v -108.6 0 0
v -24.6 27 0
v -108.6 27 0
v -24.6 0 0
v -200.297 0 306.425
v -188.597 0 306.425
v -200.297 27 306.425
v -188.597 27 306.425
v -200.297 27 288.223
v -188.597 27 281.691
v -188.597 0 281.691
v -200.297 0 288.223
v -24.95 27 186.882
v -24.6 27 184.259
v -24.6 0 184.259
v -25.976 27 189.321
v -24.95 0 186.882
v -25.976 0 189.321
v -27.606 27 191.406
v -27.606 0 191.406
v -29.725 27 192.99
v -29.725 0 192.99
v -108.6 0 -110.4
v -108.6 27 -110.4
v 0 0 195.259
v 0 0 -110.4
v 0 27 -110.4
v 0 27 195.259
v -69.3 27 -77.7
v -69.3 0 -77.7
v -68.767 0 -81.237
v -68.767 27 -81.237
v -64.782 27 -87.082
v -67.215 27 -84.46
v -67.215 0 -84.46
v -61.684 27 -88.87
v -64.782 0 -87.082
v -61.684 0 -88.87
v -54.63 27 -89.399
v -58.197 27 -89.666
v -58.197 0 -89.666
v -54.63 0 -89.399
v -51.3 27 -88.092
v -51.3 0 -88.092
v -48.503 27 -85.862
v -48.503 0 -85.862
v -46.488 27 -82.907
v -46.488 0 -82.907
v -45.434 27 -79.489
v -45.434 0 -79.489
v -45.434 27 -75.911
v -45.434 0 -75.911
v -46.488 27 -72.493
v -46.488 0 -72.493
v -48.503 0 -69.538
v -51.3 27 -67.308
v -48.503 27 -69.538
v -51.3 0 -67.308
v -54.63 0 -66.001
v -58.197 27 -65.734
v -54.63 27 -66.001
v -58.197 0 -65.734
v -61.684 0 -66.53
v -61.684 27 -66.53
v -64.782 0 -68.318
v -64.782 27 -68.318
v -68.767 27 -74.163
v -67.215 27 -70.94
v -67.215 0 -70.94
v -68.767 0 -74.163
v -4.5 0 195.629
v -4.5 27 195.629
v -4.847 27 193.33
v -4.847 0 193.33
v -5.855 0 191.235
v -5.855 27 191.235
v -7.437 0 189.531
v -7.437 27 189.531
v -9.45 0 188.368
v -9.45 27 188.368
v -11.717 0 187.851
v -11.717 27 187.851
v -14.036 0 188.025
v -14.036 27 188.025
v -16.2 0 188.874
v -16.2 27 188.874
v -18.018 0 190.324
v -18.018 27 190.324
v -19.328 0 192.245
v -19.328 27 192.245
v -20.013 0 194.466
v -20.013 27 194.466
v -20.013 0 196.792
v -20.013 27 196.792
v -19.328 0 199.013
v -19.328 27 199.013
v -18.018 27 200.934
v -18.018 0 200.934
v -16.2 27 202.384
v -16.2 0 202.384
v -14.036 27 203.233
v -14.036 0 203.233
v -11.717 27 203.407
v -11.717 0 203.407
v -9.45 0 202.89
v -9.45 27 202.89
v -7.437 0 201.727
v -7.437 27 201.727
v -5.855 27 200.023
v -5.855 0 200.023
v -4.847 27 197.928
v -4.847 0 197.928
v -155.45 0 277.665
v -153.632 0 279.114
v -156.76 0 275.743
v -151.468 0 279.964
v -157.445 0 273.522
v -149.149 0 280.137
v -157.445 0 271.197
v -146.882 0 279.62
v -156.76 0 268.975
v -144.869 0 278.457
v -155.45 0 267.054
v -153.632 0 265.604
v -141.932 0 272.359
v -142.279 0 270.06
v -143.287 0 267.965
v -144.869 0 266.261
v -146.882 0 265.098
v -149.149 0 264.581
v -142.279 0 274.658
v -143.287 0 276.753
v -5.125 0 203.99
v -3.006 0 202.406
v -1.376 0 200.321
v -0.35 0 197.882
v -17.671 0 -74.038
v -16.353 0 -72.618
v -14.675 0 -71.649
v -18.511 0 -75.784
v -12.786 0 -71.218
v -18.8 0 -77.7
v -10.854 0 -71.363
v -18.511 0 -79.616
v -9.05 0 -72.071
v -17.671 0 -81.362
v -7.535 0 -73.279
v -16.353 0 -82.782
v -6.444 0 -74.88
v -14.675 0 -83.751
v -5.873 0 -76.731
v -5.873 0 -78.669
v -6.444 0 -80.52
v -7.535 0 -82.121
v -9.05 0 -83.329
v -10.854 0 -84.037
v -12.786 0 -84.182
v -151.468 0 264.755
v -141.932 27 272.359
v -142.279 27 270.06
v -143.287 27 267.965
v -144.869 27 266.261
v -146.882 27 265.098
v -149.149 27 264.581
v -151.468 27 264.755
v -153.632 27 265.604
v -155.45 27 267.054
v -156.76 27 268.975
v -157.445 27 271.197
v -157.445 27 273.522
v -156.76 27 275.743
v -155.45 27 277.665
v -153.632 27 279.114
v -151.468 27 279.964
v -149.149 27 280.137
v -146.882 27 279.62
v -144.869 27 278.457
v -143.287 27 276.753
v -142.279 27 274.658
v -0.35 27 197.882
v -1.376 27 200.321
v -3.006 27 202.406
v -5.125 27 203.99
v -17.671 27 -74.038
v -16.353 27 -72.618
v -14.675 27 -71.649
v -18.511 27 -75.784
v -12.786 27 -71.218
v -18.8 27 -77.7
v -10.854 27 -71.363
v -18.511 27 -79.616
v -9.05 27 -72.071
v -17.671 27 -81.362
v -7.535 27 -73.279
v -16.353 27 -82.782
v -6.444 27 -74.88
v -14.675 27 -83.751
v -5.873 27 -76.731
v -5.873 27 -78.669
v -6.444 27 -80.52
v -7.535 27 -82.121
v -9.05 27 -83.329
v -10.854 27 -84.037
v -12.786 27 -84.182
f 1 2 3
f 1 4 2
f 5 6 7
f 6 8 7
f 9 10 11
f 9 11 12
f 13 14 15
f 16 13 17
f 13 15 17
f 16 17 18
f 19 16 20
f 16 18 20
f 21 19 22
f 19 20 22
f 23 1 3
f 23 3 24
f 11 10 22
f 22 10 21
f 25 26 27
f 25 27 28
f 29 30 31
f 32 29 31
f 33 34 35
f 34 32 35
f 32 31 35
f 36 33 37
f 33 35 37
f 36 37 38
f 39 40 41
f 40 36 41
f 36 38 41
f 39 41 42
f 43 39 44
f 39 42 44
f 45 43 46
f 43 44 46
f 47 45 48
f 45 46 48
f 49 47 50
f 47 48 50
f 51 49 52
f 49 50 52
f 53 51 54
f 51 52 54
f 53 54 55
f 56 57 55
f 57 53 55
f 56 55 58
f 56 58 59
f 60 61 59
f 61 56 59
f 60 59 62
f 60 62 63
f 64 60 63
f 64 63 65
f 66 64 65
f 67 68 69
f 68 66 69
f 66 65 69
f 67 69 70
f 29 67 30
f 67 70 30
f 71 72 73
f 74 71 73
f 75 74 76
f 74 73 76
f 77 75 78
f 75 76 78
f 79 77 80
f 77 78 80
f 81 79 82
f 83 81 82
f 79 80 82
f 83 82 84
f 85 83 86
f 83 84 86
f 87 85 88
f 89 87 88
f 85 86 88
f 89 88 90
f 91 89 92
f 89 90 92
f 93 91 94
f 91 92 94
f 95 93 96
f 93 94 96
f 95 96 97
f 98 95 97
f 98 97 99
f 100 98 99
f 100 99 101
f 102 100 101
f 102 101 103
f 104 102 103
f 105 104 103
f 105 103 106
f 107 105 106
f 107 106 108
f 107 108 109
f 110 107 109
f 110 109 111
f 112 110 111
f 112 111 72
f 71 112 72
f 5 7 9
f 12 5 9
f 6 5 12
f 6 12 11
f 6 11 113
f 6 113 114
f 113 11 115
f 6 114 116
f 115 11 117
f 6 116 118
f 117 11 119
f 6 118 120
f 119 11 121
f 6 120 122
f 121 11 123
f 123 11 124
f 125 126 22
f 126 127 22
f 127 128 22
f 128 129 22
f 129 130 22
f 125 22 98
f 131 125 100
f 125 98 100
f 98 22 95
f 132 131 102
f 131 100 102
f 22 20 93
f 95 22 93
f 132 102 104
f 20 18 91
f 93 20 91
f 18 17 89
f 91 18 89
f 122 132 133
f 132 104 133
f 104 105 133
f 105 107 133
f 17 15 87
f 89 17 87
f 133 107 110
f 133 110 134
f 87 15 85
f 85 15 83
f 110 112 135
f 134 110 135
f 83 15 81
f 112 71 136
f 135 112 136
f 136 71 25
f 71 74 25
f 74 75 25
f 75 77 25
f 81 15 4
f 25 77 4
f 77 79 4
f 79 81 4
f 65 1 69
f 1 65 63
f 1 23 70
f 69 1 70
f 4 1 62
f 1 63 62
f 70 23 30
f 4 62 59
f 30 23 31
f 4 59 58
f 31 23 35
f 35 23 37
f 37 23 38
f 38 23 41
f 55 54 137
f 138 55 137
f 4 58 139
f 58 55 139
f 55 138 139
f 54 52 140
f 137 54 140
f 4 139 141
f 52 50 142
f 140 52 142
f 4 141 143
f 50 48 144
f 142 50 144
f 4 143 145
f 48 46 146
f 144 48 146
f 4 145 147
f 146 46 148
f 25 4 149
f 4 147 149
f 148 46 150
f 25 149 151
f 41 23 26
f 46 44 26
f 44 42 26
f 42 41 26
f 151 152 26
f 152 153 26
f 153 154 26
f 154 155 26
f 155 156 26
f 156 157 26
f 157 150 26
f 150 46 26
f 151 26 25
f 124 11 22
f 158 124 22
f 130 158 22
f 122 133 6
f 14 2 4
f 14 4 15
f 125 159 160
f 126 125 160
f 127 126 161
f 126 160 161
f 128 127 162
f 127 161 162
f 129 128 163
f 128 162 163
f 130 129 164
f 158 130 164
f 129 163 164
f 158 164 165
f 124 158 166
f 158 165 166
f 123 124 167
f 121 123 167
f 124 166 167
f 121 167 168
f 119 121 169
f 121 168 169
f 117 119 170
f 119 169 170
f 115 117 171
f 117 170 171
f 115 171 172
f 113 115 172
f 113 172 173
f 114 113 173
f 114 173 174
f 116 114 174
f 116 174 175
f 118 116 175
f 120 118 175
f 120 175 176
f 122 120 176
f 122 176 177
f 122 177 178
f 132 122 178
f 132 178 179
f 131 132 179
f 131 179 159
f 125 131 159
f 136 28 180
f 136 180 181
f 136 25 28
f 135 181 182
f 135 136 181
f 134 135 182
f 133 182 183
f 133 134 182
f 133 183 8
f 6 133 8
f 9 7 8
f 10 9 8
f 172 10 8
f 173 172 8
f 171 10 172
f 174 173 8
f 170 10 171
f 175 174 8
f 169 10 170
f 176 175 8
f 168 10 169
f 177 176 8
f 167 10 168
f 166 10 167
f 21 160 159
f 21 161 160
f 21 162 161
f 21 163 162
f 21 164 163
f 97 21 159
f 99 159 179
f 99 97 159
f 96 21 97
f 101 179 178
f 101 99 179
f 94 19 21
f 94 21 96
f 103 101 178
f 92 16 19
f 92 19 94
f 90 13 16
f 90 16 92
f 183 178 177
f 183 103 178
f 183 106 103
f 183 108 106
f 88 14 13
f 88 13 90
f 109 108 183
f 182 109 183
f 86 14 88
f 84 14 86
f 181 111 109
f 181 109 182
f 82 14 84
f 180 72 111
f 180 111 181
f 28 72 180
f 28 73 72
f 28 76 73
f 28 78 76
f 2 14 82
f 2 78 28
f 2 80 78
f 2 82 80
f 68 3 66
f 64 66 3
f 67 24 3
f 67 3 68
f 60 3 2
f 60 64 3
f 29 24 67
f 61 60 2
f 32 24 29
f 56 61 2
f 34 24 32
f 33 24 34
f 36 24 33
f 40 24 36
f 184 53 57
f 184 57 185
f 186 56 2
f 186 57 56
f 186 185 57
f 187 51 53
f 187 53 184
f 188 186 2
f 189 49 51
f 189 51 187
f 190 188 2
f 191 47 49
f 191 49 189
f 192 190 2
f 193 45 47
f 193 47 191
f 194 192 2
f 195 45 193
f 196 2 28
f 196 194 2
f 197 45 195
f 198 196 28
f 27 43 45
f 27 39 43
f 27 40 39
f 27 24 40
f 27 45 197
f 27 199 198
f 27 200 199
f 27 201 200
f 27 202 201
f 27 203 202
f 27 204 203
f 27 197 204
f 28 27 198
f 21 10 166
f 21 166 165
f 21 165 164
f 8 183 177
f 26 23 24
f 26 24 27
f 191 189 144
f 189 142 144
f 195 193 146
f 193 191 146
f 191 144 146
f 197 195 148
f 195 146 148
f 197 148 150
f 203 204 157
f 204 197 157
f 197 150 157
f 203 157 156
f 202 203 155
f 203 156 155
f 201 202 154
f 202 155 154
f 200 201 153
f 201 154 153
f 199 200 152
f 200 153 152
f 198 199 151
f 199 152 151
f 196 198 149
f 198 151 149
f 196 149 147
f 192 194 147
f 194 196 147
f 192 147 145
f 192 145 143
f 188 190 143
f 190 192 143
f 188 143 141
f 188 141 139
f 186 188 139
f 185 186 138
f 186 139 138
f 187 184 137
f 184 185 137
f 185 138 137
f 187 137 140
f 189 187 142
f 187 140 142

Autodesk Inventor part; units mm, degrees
ref_plane "YZ Plane" through (0, 0, 0) normal (1, 0, 0) x (0, 1, 0)
ref_plane "XZ Plane" through (0, 0, 0) normal (0, 1, 0) x (-1, 0, 0)
ref_plane "XY Plane" through (0, 0, 0) normal (0, 0, 1) x (1, 0, 0)
sketch "Sketch1" plane through (0, 0, 0) normal (0, 1, 0) x (-1, 0, 0)
  line L0 (0, 0) -> (108.6, 0)
  line L1 (108.6, 0) -> (108.6, -110.4)
  line L2 (108.6, -110.4) -> (0, -110.4)
  line L3 (0, -110.4) -> (0, 0)
  circle A0 centre (12.3, -77.7) radius 6.5
  circle A1 centre (57.3, -77.7) radius 12
  dimension "d0" = 108.6
  dimension "d1" = 110.4
  dimension "d2" = 13
  dimension "altura_hoyo" = 12.3
  dimension "d5" = 32.7
  dimension "d6" = 24
  dimension "d7" = 45
extrude "Extrusion1" add sketch "Sketch1" along normal blind 27
sketch "Sketch2" plane through (0, 27, 0) normal (0, 1, 0) x (1, 0, 0)
  line L0 (0, 110.4) -> (-108.6, 110.4) construction
  line L1 (0, 0) -> (0, -195.629)
  line L2 (0, -195.629) -> (0, -201.129)
  line L3 (0, -201.129) -> (-188.5967, -306.4251)
  line L4 (-24.6, 0) -> (-24.6, -190.129)
  line L5 (-188.5967, -281.6906) -> (-24.6, -190.129)
  line L6 (-188.5967, -306.4251) -> (-188.5967, -281.6906)
  circle A0 centre (-12.3, -195.629) radius 7.8
  circle A1 centre (-12.3, 77.7) radius 6.5 construction
  line L7 (-108.6, 0) -> (0, 0) projected
  line L8 (0, 0) -> (-24.6, 0)
  line L9 (-12.3, -195.629) -> (-149.732, -272.3592) construction
  line L10 (0, -201.129) -> (-12.3, -195.629) construction
  line L11 (-42.6296, -182.067) -> (-12.3, -195.629) construction
  circle A2 centre (-149.732, -272.3592) radius 7.8
  dimension "d10" = 306.029
  dimension "d11" = 5.5
  dimension "d12" = 119.175
  dimension "Ancho_marco" = 24.6
  dimension "d18" = 15.6
  dimension "d21" = 216
  dimension "d26" = 12.3
  dimension "d_entre_ejes" = 157.401
  dimension "d28" = 15.6
  dimension "d31" = 195.629
  dimension "d32" = 273.329
extrude "Extrusion2" add sketch "Sketch2" against normal blind 27 contours L1 L2 L3 L6 L5 L4 L7 | A2
fillet "Fillet1" radius 10 2 edges at (-24.6, 13.5, 190.129) (0, 13.5, 201.129)
sketch "Sketch3" plane through (0, 27, 0) normal (0, 1, 0) x (1, 0, 0)
  line L0 (-188.5967, -281.6906) -> (-188.5967, -306.4251) projected
  line L1 (-188.5967, -306.4251) -> (-200.2967, -306.4251)
  line L2 (-200.2967, -306.4251) -> (-200.2967, -288.2229)
  line L3 (-188.5967, -306.4251) -> (-188.5967, -281.6906) projected
  line L4 (-188.5967, -281.6906) -> (-200.2967, -288.2229)
  line L5 (-29.7252, -192.9905) -> (-188.5967, -281.6906) projected
  point P0 (0, 0)
  dimension "d23" = 11.7
extrude "Extrusion3" add sketch "Sketch3" against normal blind 27
extrude "Extrusion4" cut sketch "Sketch2" against normal blind 27 contours A2
equation "\"d11\" = 0.5 * D_eje"
equation "\"d18\" = d28"
equation "\"D_eje\" = 11"
properties part number "Marco_triciclo" material "Aluminum 6061"
